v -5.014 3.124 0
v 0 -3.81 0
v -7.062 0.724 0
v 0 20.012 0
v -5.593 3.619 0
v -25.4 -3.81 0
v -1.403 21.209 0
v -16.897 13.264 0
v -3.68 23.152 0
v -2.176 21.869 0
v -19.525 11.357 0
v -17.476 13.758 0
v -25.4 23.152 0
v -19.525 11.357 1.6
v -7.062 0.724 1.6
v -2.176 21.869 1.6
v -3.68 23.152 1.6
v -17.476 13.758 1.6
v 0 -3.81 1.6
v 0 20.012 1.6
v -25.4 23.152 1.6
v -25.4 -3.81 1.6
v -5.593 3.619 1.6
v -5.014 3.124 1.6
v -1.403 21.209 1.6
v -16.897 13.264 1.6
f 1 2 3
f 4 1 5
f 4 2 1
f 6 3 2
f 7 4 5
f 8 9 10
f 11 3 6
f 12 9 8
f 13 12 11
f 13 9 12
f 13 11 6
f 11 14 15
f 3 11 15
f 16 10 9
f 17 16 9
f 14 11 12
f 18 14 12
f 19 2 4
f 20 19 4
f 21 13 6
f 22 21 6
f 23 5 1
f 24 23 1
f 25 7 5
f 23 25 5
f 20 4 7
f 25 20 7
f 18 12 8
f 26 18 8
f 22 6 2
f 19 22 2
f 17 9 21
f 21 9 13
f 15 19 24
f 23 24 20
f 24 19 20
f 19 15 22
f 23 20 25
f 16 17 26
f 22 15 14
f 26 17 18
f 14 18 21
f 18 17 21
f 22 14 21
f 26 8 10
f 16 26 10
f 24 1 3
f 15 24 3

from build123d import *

# Parameters (mm, degrees)
BOSS_EXTRUDE1_DEPTH = 1.6
BOSS_EXTRUDE2_DEPTH = 1.6


with BuildPart() as part:
    # Sketch1 → Boss-Extrude1 (new body)
    with BuildSketch(Plane.XY):
        Polygon((0, 20.012034266), (-1.403252859, 21.209327608), (-5.593180392, 3.61901348), (-5.013506757, 3.124420236), (-7.321608561, 0.419276606), (-19.784591715, 11.053031347), (-17.476489911, 13.758174978), (-16.896816276, 13.263581734), (-2.176151039, 21.868785266), (-3.680398963, 23.152250331), (-25.4, 23.152250331), (-25.4, -3.81), (0, -3.81), align=None)
    extrude(amount=BOSS_EXTRUDE1_DEPTH)

    # Sketch2 → Boss-Extrude2 (add)
    with BuildSketch(Plane.XY.offset(1.6)):
        Polygon((-19.524962716, 11.357321969), (-7.061979562, 0.723567228), (-7.321608561, 0.419276606), (-19.784591715, 11.053031347), align=None)
    extrude(amount=-BOSS_EXTRUDE2_DEPTH)


solid = part.part
